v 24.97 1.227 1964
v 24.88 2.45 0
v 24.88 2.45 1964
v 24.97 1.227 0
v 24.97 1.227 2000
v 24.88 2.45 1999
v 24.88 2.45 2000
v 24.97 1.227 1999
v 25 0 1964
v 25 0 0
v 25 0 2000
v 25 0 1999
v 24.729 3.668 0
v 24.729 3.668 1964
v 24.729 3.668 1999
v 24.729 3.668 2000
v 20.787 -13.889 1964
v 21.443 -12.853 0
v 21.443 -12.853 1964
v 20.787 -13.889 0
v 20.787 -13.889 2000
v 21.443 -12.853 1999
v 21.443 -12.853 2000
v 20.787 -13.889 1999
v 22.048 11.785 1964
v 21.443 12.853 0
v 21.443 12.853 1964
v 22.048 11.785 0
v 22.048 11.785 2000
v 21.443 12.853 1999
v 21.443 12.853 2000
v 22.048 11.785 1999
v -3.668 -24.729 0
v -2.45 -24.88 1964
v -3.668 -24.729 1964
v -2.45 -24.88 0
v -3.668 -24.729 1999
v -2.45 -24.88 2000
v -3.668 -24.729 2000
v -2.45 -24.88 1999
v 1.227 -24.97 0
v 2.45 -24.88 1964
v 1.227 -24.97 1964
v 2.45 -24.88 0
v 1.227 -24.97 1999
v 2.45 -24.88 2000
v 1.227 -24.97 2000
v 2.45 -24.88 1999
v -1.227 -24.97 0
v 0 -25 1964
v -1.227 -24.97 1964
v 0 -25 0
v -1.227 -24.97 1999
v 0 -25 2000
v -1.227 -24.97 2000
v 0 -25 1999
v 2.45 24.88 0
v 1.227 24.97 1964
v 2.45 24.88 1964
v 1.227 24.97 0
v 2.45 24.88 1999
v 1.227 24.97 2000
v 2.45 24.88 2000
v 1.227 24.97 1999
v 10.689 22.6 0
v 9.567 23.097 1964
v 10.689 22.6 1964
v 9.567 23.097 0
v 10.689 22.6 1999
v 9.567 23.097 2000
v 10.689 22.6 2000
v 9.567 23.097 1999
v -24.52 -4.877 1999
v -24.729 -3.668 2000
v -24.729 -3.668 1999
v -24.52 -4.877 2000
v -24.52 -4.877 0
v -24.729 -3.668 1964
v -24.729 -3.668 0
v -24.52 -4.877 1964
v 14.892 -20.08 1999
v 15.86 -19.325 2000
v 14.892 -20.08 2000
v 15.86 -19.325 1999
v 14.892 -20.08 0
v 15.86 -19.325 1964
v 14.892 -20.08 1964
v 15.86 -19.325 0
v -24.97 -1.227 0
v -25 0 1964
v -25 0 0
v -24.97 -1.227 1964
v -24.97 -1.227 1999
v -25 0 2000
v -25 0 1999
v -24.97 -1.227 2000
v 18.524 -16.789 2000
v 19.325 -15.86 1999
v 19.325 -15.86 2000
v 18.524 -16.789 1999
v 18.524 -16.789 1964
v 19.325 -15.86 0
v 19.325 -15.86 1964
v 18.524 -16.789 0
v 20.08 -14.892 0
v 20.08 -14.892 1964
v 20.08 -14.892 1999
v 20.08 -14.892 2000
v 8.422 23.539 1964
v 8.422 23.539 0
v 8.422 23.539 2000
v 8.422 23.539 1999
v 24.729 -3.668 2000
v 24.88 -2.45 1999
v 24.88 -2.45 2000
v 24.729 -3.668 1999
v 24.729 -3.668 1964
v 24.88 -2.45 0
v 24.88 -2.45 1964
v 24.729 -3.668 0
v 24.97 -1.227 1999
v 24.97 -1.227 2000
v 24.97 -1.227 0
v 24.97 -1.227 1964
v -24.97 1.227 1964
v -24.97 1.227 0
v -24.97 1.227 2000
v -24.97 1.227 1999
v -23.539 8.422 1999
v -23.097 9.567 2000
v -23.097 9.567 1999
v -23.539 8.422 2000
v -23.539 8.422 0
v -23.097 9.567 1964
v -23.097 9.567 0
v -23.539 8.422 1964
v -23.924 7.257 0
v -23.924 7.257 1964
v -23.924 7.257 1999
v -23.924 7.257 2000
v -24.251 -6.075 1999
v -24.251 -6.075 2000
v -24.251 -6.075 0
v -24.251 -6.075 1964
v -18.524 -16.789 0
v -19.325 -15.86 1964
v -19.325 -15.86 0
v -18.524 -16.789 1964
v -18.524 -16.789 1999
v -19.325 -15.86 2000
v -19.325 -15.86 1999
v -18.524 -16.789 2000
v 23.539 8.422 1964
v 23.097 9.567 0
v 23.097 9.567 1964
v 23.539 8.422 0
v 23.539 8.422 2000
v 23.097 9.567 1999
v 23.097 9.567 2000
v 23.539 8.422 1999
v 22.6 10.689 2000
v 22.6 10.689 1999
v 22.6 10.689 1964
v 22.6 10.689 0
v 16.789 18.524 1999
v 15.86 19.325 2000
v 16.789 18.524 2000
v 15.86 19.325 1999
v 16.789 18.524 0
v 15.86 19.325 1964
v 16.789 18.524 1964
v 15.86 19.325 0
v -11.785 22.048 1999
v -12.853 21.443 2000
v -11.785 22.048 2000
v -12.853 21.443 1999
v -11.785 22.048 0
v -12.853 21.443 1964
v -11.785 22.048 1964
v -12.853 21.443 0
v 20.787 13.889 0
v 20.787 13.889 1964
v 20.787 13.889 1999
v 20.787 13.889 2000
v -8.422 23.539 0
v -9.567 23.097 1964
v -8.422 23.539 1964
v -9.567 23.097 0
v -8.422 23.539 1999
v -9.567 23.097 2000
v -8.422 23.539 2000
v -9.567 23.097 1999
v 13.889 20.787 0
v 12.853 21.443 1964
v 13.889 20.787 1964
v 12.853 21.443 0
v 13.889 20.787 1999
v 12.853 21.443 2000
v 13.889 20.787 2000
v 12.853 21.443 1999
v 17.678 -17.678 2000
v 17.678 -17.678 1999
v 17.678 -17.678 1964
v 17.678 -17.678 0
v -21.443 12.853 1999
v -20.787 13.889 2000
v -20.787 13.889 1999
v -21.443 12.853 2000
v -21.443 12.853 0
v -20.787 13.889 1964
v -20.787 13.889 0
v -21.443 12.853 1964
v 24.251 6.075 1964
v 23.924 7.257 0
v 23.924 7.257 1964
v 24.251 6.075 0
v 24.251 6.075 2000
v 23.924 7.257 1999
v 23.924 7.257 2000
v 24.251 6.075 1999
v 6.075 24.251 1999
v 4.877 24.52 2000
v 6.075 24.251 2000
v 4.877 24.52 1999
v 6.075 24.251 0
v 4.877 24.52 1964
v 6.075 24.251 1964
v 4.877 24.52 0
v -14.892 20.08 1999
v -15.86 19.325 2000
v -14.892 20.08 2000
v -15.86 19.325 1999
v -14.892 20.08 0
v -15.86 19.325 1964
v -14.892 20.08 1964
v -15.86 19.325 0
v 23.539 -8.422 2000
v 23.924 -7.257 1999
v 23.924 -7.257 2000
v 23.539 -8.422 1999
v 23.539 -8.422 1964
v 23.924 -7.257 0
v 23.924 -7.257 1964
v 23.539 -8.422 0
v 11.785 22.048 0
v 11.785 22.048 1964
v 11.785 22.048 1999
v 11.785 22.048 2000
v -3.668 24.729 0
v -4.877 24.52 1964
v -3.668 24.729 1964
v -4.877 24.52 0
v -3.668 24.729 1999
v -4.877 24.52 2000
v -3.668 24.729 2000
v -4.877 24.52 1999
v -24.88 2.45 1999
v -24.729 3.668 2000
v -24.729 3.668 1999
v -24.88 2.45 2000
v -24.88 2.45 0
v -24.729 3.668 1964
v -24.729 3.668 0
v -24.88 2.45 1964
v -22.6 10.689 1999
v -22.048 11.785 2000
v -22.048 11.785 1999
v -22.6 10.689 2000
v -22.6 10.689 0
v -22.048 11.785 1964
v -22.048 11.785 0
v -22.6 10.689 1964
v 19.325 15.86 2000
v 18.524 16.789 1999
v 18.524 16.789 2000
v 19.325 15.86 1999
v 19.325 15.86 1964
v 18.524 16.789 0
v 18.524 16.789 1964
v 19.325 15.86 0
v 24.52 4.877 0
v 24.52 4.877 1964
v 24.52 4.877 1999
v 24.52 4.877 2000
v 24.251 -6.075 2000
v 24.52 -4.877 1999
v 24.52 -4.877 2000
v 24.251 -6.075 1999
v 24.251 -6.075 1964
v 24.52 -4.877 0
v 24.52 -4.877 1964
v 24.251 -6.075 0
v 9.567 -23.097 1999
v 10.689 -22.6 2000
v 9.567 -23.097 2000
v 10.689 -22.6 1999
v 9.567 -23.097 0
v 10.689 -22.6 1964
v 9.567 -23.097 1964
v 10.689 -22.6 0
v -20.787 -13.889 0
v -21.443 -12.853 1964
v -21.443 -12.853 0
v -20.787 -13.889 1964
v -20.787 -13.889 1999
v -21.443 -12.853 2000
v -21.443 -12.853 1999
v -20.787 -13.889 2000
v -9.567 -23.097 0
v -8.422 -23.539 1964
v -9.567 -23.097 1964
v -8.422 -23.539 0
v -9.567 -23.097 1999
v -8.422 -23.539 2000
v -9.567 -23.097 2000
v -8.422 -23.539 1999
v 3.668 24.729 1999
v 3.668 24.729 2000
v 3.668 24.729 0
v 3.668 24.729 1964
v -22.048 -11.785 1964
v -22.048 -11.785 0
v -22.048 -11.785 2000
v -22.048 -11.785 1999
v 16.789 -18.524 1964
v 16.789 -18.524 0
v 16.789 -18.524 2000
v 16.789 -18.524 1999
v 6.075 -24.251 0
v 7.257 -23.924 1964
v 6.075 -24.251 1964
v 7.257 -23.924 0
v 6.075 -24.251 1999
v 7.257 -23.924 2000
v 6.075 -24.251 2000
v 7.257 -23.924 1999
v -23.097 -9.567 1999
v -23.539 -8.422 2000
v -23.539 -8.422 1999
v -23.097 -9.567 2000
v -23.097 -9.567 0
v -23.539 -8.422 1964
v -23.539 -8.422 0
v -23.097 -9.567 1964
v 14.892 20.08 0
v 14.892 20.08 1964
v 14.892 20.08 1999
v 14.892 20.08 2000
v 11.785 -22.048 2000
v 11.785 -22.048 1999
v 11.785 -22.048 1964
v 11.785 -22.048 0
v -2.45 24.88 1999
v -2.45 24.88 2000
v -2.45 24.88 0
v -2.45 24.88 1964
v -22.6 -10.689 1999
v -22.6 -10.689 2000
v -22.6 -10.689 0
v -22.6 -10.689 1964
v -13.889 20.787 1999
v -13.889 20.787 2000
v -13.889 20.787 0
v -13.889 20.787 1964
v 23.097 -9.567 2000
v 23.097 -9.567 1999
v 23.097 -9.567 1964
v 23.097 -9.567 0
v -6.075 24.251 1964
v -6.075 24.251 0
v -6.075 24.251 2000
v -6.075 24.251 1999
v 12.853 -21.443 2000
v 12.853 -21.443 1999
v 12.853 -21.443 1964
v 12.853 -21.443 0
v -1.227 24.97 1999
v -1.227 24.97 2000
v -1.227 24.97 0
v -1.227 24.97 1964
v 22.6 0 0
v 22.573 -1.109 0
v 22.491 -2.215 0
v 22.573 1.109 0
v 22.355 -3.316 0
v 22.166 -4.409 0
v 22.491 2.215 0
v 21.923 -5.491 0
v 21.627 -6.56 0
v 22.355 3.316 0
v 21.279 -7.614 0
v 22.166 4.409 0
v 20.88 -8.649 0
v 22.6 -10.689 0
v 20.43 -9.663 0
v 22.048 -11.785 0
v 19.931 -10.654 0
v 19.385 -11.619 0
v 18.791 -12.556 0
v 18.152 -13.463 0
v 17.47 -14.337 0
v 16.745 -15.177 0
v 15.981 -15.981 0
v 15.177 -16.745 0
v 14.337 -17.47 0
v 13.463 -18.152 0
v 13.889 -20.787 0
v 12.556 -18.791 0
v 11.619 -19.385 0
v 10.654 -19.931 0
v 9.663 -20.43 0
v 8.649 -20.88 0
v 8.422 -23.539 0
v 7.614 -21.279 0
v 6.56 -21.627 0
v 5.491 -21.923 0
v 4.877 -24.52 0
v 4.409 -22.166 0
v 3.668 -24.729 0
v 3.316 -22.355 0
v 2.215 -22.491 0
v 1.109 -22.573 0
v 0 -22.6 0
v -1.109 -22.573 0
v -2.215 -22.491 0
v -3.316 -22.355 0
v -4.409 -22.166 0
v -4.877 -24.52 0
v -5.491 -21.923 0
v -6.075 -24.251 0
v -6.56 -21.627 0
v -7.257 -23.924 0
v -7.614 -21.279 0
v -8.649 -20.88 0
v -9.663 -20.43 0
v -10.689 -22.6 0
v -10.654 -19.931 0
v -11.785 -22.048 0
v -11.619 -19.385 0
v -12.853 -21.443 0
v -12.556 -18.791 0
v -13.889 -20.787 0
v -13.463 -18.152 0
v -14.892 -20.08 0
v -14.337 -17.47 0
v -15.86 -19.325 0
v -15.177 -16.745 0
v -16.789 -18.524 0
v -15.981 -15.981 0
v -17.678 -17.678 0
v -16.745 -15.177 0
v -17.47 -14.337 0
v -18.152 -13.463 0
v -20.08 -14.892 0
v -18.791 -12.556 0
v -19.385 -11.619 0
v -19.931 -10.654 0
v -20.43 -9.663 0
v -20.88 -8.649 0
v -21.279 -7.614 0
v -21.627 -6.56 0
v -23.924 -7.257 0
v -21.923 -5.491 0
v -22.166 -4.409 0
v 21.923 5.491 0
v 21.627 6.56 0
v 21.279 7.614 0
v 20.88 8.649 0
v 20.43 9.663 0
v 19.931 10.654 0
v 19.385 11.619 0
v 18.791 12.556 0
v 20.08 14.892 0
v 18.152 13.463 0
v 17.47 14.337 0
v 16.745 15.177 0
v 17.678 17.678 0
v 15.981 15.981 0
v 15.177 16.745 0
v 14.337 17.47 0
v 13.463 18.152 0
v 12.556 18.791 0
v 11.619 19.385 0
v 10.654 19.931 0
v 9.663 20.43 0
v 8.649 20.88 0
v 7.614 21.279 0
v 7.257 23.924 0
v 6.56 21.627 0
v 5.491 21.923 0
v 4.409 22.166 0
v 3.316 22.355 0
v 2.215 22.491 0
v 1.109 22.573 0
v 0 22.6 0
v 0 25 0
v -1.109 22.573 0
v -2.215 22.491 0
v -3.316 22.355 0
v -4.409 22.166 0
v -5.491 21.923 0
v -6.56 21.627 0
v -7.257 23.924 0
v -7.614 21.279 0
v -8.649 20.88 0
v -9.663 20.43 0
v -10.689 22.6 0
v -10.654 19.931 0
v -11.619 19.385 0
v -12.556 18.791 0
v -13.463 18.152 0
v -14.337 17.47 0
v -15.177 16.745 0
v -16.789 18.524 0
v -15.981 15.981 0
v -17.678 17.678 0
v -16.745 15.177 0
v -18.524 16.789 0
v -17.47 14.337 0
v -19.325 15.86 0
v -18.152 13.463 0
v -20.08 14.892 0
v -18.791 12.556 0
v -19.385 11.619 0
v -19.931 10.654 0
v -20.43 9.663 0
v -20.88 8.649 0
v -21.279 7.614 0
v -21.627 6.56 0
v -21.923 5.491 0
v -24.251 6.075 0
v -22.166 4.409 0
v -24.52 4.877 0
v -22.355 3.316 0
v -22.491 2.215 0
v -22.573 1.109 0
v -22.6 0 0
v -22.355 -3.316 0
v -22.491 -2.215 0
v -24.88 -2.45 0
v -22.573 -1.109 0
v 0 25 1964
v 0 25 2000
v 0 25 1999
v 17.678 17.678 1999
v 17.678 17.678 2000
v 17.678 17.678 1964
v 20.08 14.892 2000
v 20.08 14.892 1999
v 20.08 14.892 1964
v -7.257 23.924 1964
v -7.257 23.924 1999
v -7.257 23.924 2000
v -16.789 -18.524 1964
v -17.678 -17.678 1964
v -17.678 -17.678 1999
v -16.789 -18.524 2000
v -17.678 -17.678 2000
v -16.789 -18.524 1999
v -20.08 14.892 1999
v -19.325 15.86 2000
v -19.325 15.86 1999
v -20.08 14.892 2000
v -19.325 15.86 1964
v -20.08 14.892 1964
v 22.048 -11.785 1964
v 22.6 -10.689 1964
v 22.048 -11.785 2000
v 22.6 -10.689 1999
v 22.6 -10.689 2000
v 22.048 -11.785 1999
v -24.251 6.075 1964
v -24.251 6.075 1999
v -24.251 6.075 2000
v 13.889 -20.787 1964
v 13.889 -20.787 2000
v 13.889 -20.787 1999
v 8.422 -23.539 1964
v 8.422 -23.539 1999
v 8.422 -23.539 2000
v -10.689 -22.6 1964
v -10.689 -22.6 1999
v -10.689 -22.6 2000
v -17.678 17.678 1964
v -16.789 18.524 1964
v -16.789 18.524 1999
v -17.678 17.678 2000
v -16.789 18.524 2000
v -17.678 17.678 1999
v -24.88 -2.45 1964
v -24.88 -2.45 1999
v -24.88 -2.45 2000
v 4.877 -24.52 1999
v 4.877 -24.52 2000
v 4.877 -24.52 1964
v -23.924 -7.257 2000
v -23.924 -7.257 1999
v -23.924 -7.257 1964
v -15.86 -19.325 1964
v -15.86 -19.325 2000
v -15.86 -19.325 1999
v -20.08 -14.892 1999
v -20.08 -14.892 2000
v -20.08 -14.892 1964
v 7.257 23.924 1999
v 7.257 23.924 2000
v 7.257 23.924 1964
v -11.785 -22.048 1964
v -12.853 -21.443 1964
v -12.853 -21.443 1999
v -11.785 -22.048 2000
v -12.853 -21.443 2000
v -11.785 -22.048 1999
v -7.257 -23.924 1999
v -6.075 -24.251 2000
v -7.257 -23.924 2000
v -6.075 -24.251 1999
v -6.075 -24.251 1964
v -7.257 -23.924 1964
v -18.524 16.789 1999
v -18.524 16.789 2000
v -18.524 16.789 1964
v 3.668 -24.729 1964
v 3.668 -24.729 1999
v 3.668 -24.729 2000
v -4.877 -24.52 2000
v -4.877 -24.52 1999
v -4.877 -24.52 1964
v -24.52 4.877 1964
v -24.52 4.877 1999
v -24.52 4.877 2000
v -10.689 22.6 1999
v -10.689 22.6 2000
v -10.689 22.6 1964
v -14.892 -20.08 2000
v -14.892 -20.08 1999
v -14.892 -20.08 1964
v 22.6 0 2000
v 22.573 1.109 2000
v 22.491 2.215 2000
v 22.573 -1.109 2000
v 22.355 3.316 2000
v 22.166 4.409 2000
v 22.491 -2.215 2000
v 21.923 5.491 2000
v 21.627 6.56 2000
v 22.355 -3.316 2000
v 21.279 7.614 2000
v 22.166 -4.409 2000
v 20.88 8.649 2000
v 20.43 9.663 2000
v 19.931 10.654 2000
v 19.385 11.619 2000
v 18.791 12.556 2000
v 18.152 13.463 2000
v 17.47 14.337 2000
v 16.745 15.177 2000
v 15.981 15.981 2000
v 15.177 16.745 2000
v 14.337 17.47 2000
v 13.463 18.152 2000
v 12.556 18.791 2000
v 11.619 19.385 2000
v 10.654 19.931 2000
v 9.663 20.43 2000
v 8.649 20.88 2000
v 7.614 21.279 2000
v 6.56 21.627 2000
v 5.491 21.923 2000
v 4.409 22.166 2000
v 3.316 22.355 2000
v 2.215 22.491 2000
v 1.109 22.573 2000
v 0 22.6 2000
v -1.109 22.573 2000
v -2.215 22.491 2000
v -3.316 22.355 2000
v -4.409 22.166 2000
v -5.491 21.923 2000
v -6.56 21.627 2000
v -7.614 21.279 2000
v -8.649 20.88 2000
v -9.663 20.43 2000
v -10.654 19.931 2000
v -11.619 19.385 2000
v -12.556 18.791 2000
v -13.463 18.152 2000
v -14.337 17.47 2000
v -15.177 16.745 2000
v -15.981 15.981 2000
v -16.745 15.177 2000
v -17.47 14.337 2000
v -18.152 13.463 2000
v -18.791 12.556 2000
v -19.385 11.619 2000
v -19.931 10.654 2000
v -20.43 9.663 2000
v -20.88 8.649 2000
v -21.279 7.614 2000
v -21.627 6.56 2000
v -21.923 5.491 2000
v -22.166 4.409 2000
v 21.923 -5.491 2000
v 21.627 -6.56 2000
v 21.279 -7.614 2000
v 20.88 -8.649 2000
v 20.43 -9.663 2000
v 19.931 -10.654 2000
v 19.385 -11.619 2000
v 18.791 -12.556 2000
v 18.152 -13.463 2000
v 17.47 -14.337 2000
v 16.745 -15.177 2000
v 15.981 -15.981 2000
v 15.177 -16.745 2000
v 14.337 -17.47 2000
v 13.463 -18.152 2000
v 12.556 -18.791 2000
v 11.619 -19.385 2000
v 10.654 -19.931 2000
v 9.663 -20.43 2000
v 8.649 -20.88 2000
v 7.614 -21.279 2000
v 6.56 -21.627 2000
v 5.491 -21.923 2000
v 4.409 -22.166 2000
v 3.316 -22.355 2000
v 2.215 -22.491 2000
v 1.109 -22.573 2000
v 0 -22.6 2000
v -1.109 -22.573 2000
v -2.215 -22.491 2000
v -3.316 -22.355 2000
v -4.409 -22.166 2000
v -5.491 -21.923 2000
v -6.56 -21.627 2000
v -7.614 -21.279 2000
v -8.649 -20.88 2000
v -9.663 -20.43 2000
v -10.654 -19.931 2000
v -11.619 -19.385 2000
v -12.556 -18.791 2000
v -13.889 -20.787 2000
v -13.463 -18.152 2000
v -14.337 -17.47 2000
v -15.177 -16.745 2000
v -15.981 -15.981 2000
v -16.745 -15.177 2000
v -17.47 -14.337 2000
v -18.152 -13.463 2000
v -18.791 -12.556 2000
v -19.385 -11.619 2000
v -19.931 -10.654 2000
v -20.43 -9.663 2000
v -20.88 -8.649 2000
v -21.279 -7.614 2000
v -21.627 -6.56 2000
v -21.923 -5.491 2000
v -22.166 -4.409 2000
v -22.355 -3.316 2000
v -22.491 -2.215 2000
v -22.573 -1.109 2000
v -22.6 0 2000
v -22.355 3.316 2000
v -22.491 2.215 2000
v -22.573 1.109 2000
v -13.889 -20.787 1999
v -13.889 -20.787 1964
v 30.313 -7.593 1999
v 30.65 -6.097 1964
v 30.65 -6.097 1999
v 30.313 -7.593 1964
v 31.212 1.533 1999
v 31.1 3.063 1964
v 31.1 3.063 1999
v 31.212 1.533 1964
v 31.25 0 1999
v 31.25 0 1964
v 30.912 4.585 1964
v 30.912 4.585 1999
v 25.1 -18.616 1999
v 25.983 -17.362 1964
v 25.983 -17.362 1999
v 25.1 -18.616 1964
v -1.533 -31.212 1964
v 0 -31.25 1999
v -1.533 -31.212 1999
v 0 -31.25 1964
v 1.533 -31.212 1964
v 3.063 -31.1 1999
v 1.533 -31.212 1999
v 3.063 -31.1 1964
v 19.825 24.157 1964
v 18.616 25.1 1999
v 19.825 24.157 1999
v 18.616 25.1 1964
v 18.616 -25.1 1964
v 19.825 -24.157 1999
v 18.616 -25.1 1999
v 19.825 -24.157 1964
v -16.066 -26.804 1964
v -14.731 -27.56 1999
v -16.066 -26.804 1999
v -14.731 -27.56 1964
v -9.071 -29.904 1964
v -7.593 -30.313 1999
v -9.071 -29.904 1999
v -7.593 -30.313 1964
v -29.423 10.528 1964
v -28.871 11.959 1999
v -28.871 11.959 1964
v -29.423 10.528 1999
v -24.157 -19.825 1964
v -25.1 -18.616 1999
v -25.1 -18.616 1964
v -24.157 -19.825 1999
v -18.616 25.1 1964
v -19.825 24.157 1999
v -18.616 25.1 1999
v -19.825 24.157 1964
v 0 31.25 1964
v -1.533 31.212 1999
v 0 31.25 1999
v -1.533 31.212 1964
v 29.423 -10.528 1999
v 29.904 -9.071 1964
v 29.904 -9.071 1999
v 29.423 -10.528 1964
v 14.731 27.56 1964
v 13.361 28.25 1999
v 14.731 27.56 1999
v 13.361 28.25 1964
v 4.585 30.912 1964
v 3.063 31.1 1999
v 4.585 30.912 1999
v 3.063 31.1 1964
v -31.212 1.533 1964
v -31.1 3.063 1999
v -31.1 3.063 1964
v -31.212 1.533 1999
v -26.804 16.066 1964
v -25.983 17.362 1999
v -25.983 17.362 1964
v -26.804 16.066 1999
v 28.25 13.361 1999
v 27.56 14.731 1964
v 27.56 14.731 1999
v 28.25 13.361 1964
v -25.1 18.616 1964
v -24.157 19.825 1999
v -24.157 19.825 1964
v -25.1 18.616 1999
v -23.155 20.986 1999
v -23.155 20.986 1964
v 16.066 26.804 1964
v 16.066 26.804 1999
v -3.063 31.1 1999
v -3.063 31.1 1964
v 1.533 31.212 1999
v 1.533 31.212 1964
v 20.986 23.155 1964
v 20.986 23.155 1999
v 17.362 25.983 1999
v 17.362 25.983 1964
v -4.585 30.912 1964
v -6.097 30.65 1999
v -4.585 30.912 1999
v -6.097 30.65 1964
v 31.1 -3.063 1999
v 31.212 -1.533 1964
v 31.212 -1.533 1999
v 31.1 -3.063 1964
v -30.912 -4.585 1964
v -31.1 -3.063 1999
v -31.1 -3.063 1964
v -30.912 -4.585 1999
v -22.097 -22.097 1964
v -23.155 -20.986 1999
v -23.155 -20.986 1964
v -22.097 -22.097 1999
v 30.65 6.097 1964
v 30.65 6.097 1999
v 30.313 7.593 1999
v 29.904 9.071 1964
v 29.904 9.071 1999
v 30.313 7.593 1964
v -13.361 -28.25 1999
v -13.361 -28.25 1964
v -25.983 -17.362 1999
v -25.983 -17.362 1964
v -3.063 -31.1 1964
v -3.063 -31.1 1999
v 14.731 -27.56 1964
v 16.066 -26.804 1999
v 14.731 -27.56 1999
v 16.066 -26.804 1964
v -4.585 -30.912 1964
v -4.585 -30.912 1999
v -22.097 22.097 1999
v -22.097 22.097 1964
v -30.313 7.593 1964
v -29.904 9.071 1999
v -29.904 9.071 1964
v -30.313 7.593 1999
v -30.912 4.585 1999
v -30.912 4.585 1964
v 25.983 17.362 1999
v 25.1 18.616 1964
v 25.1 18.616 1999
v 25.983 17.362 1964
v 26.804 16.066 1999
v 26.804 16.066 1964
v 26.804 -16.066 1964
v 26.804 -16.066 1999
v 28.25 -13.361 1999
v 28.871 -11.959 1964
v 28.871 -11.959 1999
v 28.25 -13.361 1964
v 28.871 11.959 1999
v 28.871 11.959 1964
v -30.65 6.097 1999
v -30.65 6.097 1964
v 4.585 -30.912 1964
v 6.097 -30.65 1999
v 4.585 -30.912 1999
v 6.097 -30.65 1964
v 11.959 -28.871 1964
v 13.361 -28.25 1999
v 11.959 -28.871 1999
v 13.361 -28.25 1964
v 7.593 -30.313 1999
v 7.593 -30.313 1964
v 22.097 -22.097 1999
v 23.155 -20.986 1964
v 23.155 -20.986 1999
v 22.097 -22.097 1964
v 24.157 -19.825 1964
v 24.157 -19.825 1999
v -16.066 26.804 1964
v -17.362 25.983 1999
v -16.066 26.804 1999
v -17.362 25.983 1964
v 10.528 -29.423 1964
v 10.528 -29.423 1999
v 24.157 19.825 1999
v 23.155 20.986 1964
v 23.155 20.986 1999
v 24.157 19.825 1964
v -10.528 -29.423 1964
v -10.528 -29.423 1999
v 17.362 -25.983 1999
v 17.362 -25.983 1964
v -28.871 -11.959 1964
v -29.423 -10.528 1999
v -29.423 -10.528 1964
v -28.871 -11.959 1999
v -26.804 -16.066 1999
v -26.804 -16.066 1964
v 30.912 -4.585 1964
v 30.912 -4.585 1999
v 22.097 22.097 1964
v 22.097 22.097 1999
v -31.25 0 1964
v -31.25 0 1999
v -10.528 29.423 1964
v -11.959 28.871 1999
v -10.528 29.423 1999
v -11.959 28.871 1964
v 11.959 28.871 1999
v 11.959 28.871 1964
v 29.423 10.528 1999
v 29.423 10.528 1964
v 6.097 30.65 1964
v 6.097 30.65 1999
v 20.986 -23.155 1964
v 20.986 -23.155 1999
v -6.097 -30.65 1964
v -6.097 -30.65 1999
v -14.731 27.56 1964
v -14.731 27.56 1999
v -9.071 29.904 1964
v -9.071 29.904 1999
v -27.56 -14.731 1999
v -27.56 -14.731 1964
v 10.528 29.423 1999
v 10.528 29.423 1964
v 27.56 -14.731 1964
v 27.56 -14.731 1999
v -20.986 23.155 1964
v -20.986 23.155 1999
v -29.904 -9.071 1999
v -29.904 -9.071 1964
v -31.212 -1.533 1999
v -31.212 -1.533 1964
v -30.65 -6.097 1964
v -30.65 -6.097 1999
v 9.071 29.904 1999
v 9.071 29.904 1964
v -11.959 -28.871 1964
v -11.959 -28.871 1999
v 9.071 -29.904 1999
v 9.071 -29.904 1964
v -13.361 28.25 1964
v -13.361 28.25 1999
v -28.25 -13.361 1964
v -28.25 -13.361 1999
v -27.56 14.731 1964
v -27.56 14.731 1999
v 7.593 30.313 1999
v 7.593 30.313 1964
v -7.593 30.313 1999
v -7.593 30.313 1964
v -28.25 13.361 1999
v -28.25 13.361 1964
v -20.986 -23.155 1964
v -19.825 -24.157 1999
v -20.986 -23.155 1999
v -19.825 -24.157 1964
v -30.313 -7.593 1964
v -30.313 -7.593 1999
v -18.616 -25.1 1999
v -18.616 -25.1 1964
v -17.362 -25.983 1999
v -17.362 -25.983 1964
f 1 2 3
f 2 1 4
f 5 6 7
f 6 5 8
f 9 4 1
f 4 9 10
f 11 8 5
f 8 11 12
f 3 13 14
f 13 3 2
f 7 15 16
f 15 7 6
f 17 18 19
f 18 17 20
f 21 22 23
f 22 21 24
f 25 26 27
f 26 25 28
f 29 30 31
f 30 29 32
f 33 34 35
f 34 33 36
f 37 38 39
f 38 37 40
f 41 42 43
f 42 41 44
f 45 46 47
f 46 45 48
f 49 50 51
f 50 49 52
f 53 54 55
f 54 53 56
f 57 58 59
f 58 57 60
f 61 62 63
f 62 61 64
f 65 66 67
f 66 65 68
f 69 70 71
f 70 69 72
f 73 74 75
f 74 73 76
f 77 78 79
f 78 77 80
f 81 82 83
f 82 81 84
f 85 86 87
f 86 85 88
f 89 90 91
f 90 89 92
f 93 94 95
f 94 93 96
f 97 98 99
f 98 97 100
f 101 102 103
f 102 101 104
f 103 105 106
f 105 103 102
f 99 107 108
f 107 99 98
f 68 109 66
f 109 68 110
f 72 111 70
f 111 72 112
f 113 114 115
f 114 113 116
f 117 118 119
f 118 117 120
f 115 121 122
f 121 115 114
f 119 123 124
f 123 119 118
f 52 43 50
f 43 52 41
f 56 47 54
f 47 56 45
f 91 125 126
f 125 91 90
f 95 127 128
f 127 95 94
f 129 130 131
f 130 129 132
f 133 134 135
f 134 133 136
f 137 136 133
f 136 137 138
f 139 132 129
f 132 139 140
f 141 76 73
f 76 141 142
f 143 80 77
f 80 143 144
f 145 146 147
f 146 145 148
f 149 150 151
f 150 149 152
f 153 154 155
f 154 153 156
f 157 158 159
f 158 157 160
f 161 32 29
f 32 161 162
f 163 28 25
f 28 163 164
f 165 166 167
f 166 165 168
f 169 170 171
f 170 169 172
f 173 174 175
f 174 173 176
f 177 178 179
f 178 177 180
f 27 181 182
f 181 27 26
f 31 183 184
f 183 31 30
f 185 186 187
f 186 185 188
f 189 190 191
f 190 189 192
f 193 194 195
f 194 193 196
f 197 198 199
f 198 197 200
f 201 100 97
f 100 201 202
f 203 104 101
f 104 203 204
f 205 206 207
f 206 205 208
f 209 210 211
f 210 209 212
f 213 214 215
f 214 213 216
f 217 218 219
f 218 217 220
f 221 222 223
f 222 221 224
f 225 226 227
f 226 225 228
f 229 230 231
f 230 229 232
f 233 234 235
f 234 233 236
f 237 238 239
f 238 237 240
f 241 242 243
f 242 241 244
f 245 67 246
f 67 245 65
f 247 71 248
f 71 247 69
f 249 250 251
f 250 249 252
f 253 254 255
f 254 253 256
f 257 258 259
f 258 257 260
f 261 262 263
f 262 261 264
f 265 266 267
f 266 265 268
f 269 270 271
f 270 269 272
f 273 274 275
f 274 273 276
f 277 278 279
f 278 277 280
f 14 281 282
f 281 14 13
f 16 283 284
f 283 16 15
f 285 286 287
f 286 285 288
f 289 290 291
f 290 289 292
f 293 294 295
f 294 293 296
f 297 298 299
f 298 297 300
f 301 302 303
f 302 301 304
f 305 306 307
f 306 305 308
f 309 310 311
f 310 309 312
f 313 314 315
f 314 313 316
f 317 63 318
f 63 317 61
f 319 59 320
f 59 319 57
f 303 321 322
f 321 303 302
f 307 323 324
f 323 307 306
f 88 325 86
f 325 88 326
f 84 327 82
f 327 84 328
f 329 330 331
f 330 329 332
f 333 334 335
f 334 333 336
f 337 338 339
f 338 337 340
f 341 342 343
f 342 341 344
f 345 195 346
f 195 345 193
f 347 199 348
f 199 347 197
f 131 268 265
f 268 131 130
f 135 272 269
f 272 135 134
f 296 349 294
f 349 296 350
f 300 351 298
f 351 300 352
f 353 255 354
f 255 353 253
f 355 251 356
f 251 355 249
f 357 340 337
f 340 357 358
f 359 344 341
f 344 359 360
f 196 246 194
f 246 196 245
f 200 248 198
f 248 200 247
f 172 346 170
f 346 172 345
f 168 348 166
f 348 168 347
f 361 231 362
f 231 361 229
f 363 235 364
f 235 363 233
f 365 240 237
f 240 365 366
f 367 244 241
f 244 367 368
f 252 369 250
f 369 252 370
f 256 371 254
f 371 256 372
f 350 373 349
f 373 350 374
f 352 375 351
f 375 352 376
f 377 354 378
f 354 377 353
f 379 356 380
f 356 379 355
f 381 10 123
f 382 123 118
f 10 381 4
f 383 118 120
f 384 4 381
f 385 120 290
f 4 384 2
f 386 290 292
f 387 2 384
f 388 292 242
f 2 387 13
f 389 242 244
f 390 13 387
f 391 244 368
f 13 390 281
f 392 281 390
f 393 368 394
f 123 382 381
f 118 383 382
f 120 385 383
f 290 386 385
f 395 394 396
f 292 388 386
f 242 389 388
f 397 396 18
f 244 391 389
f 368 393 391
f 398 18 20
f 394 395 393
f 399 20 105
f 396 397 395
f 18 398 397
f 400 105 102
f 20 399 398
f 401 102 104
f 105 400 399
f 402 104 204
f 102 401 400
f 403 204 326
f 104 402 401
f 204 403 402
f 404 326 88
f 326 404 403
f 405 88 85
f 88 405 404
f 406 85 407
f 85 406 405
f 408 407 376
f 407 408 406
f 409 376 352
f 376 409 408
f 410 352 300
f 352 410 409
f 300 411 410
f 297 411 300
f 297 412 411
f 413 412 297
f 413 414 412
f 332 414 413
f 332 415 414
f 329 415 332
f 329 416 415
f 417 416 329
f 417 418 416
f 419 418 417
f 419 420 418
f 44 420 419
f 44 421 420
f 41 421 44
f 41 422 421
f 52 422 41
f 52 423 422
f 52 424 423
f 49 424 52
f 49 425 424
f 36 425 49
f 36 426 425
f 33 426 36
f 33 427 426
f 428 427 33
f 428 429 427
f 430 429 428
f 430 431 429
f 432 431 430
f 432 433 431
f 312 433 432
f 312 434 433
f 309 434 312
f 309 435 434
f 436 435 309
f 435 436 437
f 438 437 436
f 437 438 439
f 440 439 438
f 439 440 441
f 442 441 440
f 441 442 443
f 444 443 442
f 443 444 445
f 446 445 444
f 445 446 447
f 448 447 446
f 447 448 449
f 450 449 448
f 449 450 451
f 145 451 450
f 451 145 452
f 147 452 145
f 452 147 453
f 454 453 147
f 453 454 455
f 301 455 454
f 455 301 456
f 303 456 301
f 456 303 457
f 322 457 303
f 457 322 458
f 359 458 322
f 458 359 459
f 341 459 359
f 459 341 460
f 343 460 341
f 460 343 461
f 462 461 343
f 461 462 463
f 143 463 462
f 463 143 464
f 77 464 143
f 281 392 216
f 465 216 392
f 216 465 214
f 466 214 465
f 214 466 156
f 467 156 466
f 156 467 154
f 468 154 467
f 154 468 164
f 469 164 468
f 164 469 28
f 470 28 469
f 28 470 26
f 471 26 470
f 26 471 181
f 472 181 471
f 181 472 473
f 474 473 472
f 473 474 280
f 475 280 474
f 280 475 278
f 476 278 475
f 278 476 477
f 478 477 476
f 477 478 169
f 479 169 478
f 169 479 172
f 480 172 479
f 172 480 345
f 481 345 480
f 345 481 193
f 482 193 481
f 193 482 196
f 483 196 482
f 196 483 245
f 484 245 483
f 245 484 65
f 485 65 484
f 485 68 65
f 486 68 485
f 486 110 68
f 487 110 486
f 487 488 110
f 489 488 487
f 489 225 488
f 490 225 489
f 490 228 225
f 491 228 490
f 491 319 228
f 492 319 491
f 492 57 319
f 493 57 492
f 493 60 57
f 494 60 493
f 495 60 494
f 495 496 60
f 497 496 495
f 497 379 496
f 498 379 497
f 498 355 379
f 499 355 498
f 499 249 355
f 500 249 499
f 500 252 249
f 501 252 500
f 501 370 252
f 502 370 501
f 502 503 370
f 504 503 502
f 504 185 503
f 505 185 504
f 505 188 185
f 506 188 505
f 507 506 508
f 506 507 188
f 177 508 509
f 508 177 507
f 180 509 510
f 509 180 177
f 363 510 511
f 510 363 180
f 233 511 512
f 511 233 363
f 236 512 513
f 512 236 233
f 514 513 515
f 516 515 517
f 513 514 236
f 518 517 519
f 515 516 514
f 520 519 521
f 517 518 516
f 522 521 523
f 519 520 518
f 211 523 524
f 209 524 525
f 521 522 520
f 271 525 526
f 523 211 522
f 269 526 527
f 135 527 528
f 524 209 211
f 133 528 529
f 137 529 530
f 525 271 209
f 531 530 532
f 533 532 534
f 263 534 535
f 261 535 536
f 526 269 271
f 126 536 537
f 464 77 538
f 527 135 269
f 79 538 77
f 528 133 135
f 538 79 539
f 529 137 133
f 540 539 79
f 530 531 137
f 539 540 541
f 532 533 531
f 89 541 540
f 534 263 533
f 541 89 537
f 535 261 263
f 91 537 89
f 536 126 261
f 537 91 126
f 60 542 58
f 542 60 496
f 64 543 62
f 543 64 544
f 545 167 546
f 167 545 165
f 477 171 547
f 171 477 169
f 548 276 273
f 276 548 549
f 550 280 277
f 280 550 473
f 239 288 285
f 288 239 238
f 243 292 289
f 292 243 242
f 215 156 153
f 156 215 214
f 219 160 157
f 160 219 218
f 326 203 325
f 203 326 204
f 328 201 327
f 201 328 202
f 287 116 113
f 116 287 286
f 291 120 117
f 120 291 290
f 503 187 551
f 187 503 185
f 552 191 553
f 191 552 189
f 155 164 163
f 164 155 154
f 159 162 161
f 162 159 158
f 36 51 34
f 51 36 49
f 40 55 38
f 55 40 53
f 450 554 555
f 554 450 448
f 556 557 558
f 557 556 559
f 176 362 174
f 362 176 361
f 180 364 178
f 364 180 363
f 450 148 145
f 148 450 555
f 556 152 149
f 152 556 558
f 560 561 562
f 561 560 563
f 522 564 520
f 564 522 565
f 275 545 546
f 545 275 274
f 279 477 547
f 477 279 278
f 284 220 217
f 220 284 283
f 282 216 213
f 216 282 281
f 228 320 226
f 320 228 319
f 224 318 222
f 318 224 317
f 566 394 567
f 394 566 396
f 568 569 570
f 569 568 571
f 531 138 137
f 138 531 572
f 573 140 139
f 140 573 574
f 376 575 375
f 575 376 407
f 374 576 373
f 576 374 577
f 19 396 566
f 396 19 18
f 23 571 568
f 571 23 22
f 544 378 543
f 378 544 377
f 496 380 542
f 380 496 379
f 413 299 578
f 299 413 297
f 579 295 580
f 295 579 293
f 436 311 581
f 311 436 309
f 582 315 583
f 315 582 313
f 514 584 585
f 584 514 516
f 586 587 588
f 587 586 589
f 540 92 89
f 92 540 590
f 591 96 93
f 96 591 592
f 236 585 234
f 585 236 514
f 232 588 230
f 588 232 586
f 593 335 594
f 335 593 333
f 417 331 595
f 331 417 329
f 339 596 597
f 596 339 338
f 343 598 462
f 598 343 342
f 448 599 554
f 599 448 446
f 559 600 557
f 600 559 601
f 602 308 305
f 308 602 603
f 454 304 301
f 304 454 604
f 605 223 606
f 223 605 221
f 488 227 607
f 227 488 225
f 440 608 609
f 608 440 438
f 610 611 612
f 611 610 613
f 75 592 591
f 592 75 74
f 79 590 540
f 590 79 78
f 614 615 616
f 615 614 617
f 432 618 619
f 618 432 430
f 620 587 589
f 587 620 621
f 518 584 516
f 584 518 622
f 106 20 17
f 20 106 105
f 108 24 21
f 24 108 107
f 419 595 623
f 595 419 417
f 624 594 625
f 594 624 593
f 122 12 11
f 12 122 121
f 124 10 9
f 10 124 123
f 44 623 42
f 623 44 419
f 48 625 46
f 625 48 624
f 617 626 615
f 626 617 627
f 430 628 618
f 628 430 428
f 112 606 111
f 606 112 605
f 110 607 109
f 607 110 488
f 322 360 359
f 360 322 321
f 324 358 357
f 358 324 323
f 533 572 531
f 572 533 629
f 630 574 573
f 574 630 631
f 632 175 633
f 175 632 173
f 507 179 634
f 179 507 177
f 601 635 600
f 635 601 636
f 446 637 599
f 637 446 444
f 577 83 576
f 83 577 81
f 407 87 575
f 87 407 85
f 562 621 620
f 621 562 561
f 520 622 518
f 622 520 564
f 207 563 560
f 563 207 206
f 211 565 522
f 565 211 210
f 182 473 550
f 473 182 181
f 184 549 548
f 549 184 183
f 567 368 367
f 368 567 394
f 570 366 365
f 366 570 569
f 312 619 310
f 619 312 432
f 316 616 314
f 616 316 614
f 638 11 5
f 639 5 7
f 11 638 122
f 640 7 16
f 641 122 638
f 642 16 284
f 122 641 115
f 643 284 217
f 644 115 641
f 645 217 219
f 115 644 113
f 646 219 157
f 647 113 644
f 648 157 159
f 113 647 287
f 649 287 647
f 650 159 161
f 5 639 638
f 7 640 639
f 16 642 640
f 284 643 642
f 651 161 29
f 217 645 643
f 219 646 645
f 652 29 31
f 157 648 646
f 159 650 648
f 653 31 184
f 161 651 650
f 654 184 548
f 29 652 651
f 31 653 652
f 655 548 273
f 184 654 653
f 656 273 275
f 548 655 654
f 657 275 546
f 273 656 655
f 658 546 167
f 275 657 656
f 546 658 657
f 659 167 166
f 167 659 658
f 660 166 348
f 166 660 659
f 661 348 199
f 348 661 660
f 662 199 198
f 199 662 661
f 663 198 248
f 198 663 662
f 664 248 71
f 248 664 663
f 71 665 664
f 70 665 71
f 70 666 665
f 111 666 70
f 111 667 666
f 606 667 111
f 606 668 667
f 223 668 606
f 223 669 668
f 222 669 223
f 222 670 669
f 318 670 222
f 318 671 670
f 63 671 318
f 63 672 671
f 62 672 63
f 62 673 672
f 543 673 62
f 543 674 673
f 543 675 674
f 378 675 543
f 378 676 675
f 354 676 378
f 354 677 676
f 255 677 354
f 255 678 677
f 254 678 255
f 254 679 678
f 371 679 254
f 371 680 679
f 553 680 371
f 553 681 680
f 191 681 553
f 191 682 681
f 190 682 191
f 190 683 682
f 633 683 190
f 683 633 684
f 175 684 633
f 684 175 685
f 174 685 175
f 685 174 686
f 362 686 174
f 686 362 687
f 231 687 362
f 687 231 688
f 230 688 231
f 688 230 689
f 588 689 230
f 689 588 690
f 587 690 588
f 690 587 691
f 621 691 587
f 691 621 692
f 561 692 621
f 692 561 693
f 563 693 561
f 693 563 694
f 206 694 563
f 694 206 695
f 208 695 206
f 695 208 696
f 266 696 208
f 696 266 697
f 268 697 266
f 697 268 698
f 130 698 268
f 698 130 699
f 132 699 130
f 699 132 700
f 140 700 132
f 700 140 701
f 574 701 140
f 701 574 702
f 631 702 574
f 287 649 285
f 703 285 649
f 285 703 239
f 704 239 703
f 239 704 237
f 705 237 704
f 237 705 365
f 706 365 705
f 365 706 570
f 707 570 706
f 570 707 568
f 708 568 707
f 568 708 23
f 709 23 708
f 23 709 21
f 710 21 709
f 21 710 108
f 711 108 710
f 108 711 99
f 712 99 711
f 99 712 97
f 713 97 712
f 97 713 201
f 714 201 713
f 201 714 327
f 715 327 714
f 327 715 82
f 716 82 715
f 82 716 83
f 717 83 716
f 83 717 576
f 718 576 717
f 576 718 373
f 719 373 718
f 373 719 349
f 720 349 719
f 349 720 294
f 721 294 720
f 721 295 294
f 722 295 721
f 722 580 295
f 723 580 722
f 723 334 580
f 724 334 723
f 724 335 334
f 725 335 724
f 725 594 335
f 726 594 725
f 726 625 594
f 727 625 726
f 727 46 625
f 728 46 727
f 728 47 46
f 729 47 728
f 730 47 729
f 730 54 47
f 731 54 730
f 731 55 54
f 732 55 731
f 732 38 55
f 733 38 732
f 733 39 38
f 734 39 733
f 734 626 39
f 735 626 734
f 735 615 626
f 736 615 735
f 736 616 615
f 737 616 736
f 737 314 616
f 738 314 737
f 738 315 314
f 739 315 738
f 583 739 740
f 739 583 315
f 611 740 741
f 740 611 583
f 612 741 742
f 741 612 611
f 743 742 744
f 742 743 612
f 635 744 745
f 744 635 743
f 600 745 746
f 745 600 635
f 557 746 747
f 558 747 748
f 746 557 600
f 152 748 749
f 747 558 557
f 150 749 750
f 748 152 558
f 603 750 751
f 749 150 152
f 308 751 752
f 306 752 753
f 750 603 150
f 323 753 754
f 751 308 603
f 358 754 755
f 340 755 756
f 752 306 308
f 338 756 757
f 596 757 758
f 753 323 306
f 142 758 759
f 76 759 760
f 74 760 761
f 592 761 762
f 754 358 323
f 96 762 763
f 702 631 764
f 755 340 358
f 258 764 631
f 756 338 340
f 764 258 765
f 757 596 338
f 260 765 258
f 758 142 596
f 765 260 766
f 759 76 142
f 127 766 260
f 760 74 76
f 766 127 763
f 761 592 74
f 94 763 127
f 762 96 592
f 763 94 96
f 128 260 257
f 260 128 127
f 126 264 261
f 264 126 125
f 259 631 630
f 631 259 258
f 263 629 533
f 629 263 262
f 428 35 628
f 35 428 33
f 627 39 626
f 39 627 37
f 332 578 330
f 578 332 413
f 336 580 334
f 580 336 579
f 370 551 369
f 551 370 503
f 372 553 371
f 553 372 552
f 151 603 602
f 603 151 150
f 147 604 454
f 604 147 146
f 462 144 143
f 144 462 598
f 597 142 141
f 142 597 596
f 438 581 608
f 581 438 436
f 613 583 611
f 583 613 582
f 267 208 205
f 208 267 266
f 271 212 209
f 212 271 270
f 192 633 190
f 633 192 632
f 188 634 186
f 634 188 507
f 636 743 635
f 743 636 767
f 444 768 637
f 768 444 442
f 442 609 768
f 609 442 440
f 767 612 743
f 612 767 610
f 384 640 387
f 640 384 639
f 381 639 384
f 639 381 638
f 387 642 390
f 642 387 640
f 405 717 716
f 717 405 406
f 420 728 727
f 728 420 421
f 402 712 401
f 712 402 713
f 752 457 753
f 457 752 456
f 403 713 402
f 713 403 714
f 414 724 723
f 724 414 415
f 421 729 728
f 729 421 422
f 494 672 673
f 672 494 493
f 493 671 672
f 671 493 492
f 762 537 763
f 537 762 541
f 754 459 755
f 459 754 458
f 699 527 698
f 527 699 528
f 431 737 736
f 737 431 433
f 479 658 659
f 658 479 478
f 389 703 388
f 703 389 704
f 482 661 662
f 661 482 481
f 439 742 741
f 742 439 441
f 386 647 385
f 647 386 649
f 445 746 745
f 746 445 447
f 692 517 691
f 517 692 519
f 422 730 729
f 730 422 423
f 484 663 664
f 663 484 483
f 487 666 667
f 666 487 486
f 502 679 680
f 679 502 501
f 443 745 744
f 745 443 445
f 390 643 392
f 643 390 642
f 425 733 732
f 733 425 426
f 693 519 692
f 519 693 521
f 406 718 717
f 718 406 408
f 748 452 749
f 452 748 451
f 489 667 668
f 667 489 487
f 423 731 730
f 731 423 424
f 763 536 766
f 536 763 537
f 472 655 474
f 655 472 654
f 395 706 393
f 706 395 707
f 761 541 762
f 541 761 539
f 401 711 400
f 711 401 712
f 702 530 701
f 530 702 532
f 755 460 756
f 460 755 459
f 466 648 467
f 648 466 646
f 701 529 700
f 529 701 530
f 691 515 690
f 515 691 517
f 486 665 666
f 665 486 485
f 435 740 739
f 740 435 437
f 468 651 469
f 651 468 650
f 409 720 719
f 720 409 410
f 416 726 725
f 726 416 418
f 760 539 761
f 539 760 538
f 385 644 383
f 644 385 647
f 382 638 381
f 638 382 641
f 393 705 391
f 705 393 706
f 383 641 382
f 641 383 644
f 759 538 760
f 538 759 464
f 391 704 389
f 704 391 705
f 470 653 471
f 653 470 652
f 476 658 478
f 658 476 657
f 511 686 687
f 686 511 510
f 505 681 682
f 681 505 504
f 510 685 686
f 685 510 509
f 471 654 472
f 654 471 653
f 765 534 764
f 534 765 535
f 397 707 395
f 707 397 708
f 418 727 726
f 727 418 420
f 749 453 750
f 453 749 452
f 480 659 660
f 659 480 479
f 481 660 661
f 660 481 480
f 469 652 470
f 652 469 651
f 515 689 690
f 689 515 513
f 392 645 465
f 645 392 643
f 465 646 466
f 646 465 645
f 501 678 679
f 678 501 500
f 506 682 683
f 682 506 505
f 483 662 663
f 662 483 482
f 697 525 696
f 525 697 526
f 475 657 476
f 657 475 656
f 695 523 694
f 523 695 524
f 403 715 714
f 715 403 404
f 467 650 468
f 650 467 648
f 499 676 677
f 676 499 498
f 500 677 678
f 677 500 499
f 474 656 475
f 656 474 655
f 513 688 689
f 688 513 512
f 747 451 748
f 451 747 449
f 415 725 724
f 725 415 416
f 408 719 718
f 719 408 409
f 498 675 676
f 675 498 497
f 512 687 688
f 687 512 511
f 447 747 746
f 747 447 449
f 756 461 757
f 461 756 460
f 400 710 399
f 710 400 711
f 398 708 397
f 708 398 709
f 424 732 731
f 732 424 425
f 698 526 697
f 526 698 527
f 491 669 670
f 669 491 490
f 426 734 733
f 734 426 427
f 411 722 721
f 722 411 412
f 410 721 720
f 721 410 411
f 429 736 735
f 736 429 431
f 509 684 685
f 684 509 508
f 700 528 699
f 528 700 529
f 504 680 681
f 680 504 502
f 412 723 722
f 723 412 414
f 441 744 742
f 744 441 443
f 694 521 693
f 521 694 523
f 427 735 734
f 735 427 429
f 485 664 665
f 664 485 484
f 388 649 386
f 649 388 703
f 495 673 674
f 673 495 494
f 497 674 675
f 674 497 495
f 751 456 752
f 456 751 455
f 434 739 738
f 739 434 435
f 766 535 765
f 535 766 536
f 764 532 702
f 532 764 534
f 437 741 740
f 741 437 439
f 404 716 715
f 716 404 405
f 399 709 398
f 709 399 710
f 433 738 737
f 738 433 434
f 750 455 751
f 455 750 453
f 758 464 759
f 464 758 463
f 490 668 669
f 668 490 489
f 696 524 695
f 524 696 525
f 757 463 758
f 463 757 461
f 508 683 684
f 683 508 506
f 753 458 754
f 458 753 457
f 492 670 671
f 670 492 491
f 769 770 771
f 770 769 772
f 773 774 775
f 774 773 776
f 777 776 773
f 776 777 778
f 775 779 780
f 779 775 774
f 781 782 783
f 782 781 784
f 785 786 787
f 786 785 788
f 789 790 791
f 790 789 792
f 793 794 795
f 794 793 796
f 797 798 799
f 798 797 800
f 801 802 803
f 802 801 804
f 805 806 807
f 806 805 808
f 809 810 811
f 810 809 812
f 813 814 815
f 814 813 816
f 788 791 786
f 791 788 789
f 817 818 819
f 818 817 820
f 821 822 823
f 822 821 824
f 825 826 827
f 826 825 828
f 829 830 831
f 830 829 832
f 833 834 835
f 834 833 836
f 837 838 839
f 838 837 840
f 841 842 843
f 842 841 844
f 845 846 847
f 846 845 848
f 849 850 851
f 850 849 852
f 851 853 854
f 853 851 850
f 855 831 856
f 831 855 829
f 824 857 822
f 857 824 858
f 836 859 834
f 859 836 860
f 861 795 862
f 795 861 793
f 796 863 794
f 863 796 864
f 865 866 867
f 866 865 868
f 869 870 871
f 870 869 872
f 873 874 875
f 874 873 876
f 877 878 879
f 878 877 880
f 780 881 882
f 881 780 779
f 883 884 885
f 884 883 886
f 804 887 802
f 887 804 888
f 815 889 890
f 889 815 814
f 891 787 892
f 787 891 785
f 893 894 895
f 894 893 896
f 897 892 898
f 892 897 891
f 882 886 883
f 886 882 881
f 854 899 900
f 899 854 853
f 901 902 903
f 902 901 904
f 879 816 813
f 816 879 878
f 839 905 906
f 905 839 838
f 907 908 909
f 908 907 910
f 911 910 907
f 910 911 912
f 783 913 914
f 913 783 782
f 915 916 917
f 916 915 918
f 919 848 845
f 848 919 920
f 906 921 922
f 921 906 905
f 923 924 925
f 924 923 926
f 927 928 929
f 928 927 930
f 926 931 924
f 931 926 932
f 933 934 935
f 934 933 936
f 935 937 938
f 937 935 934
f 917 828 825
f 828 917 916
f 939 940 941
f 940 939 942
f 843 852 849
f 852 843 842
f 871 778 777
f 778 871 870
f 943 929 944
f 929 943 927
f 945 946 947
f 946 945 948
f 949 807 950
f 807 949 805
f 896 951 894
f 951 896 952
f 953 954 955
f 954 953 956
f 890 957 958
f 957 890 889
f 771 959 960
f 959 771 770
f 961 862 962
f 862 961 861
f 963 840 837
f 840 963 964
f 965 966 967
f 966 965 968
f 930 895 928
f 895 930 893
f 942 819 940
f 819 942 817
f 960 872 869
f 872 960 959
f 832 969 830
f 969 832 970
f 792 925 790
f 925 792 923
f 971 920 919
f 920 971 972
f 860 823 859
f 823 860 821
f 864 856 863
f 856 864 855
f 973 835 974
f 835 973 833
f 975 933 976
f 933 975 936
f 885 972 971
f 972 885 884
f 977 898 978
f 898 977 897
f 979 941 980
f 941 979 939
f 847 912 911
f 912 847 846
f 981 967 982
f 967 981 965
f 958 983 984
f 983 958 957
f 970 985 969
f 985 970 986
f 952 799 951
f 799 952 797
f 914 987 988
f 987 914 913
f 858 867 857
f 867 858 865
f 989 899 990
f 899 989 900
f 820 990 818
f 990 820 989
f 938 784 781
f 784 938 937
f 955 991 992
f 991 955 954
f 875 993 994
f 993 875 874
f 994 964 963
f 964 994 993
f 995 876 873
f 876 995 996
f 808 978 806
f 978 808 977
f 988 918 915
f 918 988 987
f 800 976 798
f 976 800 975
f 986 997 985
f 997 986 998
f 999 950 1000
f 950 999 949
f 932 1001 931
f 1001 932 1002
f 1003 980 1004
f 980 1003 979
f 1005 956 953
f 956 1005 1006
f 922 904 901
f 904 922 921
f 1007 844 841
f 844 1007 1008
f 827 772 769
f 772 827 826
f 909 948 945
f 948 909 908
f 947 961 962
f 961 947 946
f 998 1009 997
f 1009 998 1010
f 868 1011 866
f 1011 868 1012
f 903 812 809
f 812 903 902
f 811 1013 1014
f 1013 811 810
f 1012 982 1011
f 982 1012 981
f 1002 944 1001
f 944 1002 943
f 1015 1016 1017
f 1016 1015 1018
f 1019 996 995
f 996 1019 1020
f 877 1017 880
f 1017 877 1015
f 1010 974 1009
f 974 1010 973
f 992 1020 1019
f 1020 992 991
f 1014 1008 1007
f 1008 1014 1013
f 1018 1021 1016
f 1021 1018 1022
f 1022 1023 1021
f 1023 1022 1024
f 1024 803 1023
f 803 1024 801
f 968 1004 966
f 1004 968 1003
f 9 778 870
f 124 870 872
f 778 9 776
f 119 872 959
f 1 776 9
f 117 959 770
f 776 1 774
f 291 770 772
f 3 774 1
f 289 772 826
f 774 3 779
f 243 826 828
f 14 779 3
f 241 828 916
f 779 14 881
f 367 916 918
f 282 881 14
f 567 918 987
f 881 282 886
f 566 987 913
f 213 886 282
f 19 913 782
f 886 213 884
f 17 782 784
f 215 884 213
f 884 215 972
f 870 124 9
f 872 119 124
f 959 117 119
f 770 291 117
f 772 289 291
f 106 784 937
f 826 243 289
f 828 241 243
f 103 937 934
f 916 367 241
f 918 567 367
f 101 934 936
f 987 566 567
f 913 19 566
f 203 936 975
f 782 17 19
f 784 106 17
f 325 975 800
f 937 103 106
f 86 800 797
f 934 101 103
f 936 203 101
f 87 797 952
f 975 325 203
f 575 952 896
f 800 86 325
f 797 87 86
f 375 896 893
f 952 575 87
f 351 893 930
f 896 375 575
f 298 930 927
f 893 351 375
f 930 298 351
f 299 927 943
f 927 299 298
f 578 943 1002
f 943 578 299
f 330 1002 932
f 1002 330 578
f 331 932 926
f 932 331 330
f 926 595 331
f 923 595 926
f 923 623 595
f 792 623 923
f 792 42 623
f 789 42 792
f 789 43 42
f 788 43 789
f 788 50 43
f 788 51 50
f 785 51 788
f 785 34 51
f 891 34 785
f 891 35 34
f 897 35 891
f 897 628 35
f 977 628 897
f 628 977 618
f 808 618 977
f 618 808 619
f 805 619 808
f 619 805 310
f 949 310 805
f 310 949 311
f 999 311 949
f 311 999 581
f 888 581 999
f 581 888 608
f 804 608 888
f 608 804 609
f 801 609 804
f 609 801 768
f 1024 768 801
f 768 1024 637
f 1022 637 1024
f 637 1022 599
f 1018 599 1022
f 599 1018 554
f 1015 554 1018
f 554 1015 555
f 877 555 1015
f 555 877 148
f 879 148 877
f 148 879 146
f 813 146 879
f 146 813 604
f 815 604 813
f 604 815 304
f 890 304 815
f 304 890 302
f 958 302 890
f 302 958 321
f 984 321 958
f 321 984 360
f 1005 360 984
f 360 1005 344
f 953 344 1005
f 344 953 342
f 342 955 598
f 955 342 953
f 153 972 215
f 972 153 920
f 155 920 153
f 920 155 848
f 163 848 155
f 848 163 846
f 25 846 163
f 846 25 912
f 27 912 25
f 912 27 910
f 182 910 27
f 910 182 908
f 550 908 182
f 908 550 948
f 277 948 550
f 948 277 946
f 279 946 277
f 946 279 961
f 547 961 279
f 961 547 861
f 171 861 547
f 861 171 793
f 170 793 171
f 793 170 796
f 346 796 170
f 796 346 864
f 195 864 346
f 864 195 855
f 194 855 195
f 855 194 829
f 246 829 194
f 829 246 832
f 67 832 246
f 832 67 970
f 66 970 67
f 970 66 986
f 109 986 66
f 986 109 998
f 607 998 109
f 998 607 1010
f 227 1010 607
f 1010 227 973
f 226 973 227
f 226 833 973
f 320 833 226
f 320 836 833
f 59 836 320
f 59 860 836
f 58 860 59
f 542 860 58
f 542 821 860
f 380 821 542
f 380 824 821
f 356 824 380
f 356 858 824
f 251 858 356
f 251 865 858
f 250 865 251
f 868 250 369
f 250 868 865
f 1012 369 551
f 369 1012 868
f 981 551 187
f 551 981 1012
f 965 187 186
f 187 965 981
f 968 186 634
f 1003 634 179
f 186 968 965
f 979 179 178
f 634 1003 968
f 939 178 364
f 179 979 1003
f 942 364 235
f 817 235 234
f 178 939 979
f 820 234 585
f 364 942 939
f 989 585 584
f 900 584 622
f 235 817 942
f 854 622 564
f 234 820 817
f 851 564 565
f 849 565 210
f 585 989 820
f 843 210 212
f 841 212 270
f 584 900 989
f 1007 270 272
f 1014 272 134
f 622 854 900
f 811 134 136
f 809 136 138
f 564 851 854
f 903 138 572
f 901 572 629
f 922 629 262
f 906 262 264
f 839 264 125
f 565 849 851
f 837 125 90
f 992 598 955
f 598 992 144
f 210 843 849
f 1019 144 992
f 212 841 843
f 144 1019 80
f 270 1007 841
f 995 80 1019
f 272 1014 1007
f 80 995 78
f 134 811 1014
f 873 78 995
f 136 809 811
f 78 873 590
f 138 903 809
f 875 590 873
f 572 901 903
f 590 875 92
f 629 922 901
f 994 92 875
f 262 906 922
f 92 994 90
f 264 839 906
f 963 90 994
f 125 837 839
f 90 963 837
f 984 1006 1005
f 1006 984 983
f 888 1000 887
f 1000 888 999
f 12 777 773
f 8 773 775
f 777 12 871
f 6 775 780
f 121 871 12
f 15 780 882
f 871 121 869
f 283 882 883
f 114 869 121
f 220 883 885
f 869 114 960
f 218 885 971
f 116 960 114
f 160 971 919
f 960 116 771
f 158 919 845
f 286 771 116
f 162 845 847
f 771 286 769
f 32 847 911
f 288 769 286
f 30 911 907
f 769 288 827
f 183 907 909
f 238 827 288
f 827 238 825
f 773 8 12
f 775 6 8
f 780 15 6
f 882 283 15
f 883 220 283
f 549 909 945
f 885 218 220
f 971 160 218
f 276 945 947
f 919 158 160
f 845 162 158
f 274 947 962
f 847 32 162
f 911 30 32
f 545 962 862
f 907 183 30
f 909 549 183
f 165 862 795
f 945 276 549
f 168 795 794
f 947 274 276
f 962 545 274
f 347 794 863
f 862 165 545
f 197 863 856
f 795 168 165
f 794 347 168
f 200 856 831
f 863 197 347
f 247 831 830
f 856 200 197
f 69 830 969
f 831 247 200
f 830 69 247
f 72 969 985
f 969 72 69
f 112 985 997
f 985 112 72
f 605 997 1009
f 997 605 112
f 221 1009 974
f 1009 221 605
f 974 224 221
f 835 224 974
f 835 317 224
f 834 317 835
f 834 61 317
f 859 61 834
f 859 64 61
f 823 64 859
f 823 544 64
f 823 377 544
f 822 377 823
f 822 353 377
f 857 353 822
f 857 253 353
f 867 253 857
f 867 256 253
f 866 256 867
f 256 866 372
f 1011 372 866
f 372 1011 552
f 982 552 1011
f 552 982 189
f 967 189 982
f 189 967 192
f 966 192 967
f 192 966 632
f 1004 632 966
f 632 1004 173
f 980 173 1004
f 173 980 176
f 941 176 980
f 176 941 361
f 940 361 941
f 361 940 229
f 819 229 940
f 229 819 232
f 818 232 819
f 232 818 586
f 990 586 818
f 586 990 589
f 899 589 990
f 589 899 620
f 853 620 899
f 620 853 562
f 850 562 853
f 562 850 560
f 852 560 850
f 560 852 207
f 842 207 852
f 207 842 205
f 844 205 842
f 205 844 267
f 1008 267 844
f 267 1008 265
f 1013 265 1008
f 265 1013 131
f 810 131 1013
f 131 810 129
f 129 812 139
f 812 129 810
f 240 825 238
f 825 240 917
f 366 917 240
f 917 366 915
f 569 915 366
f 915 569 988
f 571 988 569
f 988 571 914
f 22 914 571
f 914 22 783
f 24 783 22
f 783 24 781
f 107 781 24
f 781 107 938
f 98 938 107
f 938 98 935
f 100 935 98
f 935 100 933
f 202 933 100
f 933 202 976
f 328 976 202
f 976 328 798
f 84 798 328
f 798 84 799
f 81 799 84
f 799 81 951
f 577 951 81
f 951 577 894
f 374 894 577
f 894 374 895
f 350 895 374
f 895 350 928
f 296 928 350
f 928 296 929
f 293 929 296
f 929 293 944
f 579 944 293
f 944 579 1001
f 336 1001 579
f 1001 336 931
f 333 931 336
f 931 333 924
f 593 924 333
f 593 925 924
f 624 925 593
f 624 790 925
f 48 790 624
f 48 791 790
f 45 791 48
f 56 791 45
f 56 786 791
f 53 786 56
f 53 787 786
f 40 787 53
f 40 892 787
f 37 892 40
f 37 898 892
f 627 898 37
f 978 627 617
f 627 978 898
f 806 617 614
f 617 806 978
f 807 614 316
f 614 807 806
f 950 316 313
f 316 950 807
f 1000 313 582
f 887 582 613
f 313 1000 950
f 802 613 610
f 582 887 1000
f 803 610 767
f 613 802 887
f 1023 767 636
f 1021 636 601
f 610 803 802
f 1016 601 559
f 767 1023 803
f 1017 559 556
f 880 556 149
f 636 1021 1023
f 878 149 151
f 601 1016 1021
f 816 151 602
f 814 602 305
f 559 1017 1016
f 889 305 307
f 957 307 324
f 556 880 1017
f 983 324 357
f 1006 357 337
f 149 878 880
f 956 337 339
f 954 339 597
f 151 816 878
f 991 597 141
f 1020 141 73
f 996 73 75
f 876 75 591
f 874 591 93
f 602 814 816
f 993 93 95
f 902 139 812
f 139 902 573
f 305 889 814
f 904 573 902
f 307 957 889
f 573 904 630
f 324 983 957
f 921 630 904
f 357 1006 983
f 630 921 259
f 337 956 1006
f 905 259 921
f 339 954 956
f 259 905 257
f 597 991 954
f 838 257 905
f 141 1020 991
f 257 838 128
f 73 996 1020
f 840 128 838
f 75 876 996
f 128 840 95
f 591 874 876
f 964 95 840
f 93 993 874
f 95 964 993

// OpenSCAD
// Parameters
pipe_standard = 0; //[0:0:1]
nominal_diameter_mm = 50; //[25:100:1]
length_mm = 2000; //[1000:4000:10]
pipe_od_mm = 50; //[25:100:1]
wall_thickness_mm = 2.4; //[1.2:4.8:0.1]
fitting_length_mm = 35; //[20:70:1]
fitting_od_factor = 1.25; //[1.1:1.6:0.01]
overlap_mm = 1; //[0.5:2:0.1]

$fn = 128;

// HT Pipe - one connected solid (hollow tube + integrated socket)
module ht_pipe() {
    eps = 0.02;

    od_r = pipe_od_mm/2;
    id_r = max(0.01, od_r - wall_thickness_mm);

    socket_od_r = (pipe_od_mm * fitting_od_factor)/2;
    socket_len  = fitting_length_mm;

    // Overlap must be positive and less than socket length
    ov = max(eps, min(overlap_mm, socket_len - eps));

    // Place socket so it overlaps the pipe by ov (guaranteed connection)
    socket_z0 = length_mm - socket_len - ov;

    color([0.85, 0.85, 0.8])
    union() {
        // Main pipe (hollow)
        difference() {
            cylinder(h=length_mm, r=od_r, center=false);
            translate([0, 0, -eps])
                cylinder(h=length_mm + 2*eps, r=id_r, center=false);
        }

        // Integrated end fitting (socket) - hollow ring overlapping the pipe
        translate([0, 0, socket_z0])
        difference() {
            cylinder(h=socket_len, r=socket_od_r, center=false);
            // Inner bore matches pipe OD
            translate([0, 0, -eps])
                cylinder(h=socket_len + 2*eps, r=od_r, center=false);
        }
    }
}

// Assembly
ht_pipe();
